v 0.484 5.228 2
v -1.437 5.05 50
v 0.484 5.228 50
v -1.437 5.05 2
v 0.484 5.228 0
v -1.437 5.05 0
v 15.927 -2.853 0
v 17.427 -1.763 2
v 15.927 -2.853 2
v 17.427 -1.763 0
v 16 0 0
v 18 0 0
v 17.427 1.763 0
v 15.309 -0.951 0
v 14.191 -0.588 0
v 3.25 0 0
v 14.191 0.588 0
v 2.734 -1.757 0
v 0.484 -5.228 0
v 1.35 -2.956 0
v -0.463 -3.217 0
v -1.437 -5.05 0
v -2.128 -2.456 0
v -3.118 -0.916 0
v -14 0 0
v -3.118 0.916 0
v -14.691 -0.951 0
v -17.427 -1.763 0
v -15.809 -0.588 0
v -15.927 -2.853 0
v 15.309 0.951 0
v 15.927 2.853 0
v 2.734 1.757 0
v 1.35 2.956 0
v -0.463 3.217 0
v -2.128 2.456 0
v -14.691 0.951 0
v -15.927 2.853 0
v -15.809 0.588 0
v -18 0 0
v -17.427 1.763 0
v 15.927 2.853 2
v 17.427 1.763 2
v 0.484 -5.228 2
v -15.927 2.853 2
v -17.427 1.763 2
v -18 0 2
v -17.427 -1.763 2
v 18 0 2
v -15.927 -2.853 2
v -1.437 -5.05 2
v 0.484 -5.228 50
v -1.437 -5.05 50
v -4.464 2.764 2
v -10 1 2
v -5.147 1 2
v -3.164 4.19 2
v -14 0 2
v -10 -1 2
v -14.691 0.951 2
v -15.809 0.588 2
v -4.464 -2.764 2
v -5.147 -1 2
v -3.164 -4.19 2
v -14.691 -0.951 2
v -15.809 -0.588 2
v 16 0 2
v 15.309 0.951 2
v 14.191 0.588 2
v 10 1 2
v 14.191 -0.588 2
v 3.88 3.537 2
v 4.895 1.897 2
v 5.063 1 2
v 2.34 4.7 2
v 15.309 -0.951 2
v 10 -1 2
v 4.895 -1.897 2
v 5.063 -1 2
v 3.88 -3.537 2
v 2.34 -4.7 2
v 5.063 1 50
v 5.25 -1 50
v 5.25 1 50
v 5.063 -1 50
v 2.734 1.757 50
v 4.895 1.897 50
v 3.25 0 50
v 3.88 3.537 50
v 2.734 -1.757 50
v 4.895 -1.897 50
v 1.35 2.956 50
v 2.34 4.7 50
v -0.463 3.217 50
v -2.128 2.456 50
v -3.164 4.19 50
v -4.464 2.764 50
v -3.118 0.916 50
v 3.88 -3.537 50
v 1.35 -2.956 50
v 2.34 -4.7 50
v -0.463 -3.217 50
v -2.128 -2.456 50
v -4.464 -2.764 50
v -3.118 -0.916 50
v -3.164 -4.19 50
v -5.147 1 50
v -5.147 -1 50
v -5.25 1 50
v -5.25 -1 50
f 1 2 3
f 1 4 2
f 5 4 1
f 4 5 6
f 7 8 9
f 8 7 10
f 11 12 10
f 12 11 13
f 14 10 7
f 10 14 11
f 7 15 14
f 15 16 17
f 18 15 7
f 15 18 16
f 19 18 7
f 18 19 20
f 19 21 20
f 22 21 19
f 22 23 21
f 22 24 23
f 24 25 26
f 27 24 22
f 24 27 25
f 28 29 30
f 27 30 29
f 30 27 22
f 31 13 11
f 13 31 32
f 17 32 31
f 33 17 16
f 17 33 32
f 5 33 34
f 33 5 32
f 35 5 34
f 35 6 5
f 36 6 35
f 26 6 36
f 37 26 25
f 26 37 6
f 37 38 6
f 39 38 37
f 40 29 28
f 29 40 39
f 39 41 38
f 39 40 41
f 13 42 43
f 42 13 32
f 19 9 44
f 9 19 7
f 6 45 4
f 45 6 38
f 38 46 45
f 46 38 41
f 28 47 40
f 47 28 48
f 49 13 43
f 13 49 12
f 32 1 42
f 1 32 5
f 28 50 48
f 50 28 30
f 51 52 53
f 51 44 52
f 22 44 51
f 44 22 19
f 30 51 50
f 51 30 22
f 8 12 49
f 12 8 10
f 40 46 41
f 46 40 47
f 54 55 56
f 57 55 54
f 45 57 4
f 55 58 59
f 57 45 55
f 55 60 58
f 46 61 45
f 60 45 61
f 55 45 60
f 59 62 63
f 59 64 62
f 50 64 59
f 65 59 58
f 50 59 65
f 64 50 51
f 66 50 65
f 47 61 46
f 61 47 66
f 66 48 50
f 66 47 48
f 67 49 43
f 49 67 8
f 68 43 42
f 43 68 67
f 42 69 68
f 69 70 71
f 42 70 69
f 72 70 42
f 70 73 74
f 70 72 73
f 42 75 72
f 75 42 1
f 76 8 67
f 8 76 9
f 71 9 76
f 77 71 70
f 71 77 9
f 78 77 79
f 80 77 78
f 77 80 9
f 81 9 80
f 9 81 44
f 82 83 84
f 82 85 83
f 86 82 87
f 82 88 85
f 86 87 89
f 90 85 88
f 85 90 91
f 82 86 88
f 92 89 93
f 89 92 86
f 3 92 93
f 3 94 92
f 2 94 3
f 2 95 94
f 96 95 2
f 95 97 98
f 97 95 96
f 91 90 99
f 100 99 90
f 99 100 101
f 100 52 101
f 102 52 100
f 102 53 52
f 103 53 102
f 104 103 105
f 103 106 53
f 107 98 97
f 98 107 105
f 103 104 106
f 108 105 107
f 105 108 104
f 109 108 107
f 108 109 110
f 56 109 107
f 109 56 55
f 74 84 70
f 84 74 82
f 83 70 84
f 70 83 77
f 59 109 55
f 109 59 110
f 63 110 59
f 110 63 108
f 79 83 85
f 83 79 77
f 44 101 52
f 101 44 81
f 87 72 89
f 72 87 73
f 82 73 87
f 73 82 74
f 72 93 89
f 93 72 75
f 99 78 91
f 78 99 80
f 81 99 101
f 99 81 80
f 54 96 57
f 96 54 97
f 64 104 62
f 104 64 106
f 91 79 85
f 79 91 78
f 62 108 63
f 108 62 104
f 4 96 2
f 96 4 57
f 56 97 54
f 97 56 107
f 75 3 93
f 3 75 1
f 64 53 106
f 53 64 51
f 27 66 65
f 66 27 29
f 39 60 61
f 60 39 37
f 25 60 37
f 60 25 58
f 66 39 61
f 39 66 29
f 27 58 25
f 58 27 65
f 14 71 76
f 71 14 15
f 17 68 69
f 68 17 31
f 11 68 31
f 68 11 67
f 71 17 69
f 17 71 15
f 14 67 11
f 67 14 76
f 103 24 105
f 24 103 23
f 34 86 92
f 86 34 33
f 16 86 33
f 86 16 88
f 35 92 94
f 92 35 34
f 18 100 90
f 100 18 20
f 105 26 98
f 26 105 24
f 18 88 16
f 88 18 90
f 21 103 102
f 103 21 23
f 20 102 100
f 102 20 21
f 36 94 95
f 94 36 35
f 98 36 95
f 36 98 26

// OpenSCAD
shaft_dia = 6.5;
screw_dia = 2;
thickness = 2;
screw_offset = 15;
height = 50;

module support() {
  difference() {
    union() {
      hull() {
        translate([-screw_offset,0,0]) cylinder(r=3, h=thickness);
        translate([screw_offset,0,0]) cylinder(r=3, h=thickness);
        cylinder(r=(shaft_dia/2)+thickness, h=thickness);
      }
      hull() {
        translate([-(screw_offset - 5), -thickness/2, 0]) cube([(screw_offset-5)*2, thickness, thickness]);
        translate([-((shaft_dia/2)+thickness),-thickness/2, 0]) cube([shaft_dia+thickness*2, thickness, height]);
      }
      cylinder(r=(shaft_dia/2)+thickness, h=height);
    }
    union() {
      translate([-screw_offset,0,0]) cylinder(r=screw_dia/2, h=thickness);
      translate([screw_offset,0,0]) cylinder(r=screw_dia/2, h=thickness);
      cylinder(r=shaft_dia/2, h=height);
    }
  }
}

support();
